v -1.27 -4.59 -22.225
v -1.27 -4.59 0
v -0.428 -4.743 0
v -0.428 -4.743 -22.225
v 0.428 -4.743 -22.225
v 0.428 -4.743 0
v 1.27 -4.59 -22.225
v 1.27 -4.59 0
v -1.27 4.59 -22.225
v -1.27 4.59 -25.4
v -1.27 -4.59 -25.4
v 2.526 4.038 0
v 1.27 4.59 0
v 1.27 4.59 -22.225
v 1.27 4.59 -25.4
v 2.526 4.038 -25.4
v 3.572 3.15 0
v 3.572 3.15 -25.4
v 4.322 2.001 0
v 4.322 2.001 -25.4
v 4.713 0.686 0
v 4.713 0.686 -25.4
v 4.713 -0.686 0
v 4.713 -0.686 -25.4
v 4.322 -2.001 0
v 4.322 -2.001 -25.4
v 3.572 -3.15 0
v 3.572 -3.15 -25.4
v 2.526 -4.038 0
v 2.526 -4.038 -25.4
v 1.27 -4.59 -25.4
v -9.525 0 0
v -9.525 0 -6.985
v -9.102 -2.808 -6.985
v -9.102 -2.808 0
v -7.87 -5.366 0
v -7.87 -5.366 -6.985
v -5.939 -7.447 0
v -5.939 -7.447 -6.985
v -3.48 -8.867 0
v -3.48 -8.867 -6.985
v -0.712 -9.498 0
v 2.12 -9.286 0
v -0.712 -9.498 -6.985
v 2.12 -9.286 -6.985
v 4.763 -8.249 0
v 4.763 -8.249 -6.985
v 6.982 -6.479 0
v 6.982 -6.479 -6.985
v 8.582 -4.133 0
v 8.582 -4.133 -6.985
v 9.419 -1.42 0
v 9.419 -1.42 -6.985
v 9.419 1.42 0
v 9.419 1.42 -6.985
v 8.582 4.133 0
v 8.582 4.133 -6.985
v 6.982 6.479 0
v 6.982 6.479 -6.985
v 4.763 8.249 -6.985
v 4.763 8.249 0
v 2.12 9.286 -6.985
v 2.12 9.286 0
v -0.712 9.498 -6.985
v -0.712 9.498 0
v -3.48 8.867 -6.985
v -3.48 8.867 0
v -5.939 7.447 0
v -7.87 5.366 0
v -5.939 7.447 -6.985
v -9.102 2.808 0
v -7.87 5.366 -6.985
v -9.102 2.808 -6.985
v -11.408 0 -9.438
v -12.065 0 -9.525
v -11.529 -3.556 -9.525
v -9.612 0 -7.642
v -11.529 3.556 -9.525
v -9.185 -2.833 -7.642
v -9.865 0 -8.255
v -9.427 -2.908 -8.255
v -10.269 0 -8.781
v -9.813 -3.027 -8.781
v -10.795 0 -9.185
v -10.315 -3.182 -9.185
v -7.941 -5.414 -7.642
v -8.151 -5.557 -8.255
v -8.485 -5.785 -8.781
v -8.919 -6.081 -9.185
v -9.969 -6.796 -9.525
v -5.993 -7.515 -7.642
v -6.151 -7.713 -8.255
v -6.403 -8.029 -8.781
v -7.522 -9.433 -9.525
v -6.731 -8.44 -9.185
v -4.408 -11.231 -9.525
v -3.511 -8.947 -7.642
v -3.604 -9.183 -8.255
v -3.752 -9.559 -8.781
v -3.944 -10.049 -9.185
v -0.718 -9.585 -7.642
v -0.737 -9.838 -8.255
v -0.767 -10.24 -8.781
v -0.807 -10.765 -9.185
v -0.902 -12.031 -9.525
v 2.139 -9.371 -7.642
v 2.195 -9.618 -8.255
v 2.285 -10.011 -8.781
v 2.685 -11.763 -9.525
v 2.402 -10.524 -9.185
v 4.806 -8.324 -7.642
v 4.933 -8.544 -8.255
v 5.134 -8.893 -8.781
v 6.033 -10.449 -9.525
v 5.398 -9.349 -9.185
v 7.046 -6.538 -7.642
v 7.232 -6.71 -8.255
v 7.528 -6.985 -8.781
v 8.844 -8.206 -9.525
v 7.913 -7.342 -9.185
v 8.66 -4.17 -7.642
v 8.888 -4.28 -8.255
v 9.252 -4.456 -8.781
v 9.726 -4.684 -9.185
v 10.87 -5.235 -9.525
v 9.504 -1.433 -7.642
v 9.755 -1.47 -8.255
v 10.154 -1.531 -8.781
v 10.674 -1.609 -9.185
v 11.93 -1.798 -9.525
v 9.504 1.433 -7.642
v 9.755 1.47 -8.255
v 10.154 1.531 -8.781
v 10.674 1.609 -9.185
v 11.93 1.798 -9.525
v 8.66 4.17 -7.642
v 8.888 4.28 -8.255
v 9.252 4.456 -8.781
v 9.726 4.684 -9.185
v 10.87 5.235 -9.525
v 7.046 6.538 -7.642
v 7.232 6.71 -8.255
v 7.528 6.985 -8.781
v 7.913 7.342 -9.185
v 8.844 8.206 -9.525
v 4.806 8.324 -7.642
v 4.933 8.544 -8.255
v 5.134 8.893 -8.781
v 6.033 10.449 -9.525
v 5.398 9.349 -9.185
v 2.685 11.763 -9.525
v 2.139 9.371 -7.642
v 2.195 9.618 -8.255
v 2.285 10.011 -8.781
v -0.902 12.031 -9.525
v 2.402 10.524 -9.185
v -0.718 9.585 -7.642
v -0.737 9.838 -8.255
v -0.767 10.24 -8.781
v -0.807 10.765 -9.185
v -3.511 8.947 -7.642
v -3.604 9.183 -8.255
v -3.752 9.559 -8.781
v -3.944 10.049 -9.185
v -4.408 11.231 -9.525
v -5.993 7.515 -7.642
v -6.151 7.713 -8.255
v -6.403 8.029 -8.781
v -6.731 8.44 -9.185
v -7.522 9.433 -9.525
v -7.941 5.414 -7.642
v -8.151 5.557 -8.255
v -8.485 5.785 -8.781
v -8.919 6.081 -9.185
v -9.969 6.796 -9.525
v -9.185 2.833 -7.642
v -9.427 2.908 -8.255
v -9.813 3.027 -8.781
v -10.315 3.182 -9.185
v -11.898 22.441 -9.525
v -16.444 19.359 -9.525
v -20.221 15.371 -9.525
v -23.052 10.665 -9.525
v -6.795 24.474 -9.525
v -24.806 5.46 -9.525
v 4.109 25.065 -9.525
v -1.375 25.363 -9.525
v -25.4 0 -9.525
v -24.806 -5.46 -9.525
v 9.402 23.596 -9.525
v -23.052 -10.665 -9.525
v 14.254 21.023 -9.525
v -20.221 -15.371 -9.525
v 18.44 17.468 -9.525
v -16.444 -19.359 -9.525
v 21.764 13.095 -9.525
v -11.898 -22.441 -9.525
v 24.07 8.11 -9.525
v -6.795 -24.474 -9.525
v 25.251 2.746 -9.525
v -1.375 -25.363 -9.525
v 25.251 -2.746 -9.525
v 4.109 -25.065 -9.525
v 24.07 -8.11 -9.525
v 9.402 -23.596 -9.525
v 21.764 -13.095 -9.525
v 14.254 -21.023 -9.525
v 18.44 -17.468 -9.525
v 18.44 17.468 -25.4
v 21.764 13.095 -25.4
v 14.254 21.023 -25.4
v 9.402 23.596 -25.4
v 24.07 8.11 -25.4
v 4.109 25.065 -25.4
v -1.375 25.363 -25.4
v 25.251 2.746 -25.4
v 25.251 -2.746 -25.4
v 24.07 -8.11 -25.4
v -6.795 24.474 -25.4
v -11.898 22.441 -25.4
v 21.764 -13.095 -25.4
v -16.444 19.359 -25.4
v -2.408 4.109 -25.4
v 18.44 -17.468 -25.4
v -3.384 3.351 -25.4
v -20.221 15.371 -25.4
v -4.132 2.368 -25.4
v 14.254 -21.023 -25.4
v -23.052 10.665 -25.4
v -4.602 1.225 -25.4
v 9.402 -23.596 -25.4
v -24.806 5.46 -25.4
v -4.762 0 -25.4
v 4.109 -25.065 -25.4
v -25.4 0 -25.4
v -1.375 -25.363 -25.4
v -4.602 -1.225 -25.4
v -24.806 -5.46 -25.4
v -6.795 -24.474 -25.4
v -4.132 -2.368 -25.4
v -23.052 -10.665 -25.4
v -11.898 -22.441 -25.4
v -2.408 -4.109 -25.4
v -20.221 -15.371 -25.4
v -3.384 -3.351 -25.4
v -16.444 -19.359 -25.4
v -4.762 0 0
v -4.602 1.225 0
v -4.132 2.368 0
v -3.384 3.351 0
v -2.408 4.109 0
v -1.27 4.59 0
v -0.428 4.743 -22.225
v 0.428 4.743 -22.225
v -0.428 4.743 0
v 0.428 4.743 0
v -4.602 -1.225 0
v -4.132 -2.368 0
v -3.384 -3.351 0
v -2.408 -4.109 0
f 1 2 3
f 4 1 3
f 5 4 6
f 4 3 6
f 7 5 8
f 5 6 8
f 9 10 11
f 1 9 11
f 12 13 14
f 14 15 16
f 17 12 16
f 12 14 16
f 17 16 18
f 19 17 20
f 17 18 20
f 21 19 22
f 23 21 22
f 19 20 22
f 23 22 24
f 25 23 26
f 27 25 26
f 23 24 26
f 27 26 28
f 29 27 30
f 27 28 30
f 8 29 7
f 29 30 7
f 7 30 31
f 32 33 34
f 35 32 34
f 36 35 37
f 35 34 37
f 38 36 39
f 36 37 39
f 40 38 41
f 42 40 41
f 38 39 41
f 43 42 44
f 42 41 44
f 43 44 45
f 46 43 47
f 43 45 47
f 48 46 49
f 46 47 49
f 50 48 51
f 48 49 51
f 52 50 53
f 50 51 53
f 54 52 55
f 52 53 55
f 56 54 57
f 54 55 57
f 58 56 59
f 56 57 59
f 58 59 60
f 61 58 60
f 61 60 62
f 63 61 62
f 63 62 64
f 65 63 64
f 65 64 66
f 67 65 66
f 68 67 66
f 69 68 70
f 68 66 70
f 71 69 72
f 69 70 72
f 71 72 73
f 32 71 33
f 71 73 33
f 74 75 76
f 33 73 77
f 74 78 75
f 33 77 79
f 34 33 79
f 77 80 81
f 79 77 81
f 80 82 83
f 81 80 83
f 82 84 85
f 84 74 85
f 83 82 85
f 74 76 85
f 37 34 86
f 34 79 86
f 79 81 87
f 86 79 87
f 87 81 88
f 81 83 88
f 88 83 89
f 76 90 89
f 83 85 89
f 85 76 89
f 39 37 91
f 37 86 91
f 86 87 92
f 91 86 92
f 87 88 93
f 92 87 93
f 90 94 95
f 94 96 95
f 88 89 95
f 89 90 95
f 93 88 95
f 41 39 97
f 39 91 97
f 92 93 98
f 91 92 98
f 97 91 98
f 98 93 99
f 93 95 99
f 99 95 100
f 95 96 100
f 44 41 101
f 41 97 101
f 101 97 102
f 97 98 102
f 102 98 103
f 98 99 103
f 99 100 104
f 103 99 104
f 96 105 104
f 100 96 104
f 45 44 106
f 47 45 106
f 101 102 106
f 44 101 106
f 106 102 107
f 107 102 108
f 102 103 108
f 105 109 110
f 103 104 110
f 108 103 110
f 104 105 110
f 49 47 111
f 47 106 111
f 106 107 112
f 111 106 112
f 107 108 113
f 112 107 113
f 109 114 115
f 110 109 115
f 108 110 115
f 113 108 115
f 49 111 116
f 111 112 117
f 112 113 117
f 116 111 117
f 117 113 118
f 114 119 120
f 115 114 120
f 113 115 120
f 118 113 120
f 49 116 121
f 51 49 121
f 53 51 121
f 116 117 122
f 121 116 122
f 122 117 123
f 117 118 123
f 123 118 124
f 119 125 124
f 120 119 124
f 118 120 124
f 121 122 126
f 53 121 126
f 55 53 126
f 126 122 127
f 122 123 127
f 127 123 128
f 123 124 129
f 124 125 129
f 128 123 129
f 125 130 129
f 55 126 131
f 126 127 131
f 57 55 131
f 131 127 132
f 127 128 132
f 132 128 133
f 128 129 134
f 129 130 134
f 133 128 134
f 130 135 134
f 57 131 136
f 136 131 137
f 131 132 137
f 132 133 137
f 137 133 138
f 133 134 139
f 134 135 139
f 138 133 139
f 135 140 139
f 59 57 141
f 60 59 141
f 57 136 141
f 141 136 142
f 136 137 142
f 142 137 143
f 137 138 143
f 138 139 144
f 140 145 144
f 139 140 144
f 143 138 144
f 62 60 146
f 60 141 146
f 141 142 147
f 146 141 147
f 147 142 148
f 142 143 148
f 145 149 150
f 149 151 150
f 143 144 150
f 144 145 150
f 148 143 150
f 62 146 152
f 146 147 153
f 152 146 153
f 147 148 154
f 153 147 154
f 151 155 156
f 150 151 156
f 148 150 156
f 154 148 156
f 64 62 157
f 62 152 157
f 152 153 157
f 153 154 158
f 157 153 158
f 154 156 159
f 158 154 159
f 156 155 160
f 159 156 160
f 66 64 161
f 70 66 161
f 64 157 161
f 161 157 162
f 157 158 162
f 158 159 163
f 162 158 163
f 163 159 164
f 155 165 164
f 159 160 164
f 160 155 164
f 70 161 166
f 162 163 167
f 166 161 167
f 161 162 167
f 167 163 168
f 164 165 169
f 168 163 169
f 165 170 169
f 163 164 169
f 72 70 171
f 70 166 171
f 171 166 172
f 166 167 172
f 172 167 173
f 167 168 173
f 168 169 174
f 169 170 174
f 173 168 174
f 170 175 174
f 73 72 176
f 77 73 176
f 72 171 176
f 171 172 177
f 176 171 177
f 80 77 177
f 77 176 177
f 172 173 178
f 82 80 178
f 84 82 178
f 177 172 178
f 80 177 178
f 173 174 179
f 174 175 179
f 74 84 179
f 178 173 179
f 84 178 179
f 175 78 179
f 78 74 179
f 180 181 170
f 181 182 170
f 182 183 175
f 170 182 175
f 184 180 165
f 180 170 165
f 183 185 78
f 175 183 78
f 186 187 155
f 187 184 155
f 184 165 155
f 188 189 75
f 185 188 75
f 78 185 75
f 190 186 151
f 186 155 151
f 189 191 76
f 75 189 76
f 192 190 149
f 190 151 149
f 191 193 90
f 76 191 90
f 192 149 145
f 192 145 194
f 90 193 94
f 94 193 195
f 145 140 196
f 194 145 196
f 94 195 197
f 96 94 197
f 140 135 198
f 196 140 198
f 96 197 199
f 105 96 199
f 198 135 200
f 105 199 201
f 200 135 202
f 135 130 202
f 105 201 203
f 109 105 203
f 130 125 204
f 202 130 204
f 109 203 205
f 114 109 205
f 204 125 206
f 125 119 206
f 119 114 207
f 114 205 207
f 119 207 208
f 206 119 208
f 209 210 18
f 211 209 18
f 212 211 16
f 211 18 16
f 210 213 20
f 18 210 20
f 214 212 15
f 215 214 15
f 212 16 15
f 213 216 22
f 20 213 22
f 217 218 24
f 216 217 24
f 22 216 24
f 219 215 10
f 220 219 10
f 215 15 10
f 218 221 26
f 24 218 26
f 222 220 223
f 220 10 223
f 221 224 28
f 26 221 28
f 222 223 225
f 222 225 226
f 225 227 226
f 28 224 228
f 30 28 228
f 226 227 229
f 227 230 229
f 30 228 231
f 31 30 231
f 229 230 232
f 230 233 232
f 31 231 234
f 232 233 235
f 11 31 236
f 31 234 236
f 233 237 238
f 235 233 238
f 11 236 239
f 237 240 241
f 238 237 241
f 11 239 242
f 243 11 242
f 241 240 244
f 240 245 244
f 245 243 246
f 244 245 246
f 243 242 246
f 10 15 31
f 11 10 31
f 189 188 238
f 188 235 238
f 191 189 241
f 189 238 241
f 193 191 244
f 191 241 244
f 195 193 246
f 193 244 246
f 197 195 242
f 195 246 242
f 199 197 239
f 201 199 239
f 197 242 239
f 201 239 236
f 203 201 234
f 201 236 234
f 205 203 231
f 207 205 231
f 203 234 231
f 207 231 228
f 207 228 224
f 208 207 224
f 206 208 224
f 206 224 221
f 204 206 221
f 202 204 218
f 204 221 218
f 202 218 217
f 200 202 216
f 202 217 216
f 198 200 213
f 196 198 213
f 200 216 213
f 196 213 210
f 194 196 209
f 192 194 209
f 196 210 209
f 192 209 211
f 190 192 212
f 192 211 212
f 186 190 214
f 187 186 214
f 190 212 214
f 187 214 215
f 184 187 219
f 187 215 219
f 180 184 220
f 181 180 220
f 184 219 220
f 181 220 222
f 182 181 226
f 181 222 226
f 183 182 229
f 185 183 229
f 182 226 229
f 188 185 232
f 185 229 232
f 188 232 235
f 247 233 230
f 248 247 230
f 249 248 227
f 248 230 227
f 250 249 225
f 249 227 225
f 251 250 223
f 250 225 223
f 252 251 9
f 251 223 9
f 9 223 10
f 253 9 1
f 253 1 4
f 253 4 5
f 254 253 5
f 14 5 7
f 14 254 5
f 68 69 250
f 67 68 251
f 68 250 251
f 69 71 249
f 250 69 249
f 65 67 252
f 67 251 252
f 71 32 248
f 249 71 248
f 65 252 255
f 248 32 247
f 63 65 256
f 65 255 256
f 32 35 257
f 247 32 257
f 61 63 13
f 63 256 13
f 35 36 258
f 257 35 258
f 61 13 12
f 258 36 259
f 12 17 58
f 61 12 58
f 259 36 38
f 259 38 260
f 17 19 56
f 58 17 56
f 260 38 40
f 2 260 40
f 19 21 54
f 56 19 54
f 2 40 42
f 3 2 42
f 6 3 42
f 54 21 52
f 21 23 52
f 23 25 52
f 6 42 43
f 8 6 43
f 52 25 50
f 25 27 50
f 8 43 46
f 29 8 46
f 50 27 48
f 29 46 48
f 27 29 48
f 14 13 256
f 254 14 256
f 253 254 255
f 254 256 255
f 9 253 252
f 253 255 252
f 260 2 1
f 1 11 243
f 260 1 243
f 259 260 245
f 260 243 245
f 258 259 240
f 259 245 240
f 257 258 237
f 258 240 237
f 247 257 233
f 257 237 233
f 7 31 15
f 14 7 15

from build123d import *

# Parameters (mm, degrees)
CUT_EXTRUDE1_DEPTH = 26.4
CUT_EXTRUDE2_DEPTH = 22.225
FILLET1_R          = 2.54


with BuildPart() as part:
    # Sketch1 → Revolve1 (revolve)
    with BuildSketch(Plane(origin=(0, 0, 0), x_dir=(1, 0, 0), z_dir=(0, 1, 0))):
        Polygon((0, 0), (-9.525, 0), (-9.525, 9.525), (-25.4, 9.525), (-25.4, 25.4), (0, 25.4), align=None)
    revolve(axis=Axis((0, 0, -87.406759955), (0, 0, 1)))

    # Sketch2 → Cut-Extrude1 (cut, through all)
    with BuildSketch(Plane(origin=(0, 0, -25.4), x_dir=(-1, 0, 0), z_dir=(0, 0, -1))):
        with BuildLine():
            Line((-1.27, -4.590044254), (-1.27, 4.590044254))
            ThreePointArc((-1.27, 4.590044254), (-4.7625, 0), (-1.27, -4.590044254))
        make_face()
        with BuildLine():
            ThreePointArc((4.7625, 0), (3.790104303, 2.883836962), (1.27, 4.590044254))
            Line((1.27, 4.590044254), (1.27, -4.590044254))
            ThreePointArc((1.27, -4.590044254), (3.790104303, -2.883836962), (4.7625, 0))
        make_face()
    extrude(amount=-CUT_EXTRUDE1_DEPTH, mode=Mode.SUBTRACT)

    # Sketch3 → Cut-Extrude2 (cut)
    with BuildSketch(Plane.XY):
        with BuildLine():
            ThreePointArc((1.27, 4.590044254), (0, 4.7625), (-1.27, 4.590044254))
            Line((-1.27, 4.590044254), (-1.27, -4.590044254))
            ThreePointArc((-1.27, -4.590044254), (0, -4.7625), (1.27, -4.590044254))
            Line((1.27, -4.590044254), (1.27, 4.590044254))
        make_face()
    extrude(amount=-CUT_EXTRUDE2_DEPTH, mode=Mode.SUBTRACT)

    # Fillet1
    fillet1_edges = [part.edges().sort_by_distance(p)[0] for p in [
        (9.525, 0, -9.525),
    ]]
    fillet(fillet1_edges, radius=FILLET1_R)


solid = part.part
